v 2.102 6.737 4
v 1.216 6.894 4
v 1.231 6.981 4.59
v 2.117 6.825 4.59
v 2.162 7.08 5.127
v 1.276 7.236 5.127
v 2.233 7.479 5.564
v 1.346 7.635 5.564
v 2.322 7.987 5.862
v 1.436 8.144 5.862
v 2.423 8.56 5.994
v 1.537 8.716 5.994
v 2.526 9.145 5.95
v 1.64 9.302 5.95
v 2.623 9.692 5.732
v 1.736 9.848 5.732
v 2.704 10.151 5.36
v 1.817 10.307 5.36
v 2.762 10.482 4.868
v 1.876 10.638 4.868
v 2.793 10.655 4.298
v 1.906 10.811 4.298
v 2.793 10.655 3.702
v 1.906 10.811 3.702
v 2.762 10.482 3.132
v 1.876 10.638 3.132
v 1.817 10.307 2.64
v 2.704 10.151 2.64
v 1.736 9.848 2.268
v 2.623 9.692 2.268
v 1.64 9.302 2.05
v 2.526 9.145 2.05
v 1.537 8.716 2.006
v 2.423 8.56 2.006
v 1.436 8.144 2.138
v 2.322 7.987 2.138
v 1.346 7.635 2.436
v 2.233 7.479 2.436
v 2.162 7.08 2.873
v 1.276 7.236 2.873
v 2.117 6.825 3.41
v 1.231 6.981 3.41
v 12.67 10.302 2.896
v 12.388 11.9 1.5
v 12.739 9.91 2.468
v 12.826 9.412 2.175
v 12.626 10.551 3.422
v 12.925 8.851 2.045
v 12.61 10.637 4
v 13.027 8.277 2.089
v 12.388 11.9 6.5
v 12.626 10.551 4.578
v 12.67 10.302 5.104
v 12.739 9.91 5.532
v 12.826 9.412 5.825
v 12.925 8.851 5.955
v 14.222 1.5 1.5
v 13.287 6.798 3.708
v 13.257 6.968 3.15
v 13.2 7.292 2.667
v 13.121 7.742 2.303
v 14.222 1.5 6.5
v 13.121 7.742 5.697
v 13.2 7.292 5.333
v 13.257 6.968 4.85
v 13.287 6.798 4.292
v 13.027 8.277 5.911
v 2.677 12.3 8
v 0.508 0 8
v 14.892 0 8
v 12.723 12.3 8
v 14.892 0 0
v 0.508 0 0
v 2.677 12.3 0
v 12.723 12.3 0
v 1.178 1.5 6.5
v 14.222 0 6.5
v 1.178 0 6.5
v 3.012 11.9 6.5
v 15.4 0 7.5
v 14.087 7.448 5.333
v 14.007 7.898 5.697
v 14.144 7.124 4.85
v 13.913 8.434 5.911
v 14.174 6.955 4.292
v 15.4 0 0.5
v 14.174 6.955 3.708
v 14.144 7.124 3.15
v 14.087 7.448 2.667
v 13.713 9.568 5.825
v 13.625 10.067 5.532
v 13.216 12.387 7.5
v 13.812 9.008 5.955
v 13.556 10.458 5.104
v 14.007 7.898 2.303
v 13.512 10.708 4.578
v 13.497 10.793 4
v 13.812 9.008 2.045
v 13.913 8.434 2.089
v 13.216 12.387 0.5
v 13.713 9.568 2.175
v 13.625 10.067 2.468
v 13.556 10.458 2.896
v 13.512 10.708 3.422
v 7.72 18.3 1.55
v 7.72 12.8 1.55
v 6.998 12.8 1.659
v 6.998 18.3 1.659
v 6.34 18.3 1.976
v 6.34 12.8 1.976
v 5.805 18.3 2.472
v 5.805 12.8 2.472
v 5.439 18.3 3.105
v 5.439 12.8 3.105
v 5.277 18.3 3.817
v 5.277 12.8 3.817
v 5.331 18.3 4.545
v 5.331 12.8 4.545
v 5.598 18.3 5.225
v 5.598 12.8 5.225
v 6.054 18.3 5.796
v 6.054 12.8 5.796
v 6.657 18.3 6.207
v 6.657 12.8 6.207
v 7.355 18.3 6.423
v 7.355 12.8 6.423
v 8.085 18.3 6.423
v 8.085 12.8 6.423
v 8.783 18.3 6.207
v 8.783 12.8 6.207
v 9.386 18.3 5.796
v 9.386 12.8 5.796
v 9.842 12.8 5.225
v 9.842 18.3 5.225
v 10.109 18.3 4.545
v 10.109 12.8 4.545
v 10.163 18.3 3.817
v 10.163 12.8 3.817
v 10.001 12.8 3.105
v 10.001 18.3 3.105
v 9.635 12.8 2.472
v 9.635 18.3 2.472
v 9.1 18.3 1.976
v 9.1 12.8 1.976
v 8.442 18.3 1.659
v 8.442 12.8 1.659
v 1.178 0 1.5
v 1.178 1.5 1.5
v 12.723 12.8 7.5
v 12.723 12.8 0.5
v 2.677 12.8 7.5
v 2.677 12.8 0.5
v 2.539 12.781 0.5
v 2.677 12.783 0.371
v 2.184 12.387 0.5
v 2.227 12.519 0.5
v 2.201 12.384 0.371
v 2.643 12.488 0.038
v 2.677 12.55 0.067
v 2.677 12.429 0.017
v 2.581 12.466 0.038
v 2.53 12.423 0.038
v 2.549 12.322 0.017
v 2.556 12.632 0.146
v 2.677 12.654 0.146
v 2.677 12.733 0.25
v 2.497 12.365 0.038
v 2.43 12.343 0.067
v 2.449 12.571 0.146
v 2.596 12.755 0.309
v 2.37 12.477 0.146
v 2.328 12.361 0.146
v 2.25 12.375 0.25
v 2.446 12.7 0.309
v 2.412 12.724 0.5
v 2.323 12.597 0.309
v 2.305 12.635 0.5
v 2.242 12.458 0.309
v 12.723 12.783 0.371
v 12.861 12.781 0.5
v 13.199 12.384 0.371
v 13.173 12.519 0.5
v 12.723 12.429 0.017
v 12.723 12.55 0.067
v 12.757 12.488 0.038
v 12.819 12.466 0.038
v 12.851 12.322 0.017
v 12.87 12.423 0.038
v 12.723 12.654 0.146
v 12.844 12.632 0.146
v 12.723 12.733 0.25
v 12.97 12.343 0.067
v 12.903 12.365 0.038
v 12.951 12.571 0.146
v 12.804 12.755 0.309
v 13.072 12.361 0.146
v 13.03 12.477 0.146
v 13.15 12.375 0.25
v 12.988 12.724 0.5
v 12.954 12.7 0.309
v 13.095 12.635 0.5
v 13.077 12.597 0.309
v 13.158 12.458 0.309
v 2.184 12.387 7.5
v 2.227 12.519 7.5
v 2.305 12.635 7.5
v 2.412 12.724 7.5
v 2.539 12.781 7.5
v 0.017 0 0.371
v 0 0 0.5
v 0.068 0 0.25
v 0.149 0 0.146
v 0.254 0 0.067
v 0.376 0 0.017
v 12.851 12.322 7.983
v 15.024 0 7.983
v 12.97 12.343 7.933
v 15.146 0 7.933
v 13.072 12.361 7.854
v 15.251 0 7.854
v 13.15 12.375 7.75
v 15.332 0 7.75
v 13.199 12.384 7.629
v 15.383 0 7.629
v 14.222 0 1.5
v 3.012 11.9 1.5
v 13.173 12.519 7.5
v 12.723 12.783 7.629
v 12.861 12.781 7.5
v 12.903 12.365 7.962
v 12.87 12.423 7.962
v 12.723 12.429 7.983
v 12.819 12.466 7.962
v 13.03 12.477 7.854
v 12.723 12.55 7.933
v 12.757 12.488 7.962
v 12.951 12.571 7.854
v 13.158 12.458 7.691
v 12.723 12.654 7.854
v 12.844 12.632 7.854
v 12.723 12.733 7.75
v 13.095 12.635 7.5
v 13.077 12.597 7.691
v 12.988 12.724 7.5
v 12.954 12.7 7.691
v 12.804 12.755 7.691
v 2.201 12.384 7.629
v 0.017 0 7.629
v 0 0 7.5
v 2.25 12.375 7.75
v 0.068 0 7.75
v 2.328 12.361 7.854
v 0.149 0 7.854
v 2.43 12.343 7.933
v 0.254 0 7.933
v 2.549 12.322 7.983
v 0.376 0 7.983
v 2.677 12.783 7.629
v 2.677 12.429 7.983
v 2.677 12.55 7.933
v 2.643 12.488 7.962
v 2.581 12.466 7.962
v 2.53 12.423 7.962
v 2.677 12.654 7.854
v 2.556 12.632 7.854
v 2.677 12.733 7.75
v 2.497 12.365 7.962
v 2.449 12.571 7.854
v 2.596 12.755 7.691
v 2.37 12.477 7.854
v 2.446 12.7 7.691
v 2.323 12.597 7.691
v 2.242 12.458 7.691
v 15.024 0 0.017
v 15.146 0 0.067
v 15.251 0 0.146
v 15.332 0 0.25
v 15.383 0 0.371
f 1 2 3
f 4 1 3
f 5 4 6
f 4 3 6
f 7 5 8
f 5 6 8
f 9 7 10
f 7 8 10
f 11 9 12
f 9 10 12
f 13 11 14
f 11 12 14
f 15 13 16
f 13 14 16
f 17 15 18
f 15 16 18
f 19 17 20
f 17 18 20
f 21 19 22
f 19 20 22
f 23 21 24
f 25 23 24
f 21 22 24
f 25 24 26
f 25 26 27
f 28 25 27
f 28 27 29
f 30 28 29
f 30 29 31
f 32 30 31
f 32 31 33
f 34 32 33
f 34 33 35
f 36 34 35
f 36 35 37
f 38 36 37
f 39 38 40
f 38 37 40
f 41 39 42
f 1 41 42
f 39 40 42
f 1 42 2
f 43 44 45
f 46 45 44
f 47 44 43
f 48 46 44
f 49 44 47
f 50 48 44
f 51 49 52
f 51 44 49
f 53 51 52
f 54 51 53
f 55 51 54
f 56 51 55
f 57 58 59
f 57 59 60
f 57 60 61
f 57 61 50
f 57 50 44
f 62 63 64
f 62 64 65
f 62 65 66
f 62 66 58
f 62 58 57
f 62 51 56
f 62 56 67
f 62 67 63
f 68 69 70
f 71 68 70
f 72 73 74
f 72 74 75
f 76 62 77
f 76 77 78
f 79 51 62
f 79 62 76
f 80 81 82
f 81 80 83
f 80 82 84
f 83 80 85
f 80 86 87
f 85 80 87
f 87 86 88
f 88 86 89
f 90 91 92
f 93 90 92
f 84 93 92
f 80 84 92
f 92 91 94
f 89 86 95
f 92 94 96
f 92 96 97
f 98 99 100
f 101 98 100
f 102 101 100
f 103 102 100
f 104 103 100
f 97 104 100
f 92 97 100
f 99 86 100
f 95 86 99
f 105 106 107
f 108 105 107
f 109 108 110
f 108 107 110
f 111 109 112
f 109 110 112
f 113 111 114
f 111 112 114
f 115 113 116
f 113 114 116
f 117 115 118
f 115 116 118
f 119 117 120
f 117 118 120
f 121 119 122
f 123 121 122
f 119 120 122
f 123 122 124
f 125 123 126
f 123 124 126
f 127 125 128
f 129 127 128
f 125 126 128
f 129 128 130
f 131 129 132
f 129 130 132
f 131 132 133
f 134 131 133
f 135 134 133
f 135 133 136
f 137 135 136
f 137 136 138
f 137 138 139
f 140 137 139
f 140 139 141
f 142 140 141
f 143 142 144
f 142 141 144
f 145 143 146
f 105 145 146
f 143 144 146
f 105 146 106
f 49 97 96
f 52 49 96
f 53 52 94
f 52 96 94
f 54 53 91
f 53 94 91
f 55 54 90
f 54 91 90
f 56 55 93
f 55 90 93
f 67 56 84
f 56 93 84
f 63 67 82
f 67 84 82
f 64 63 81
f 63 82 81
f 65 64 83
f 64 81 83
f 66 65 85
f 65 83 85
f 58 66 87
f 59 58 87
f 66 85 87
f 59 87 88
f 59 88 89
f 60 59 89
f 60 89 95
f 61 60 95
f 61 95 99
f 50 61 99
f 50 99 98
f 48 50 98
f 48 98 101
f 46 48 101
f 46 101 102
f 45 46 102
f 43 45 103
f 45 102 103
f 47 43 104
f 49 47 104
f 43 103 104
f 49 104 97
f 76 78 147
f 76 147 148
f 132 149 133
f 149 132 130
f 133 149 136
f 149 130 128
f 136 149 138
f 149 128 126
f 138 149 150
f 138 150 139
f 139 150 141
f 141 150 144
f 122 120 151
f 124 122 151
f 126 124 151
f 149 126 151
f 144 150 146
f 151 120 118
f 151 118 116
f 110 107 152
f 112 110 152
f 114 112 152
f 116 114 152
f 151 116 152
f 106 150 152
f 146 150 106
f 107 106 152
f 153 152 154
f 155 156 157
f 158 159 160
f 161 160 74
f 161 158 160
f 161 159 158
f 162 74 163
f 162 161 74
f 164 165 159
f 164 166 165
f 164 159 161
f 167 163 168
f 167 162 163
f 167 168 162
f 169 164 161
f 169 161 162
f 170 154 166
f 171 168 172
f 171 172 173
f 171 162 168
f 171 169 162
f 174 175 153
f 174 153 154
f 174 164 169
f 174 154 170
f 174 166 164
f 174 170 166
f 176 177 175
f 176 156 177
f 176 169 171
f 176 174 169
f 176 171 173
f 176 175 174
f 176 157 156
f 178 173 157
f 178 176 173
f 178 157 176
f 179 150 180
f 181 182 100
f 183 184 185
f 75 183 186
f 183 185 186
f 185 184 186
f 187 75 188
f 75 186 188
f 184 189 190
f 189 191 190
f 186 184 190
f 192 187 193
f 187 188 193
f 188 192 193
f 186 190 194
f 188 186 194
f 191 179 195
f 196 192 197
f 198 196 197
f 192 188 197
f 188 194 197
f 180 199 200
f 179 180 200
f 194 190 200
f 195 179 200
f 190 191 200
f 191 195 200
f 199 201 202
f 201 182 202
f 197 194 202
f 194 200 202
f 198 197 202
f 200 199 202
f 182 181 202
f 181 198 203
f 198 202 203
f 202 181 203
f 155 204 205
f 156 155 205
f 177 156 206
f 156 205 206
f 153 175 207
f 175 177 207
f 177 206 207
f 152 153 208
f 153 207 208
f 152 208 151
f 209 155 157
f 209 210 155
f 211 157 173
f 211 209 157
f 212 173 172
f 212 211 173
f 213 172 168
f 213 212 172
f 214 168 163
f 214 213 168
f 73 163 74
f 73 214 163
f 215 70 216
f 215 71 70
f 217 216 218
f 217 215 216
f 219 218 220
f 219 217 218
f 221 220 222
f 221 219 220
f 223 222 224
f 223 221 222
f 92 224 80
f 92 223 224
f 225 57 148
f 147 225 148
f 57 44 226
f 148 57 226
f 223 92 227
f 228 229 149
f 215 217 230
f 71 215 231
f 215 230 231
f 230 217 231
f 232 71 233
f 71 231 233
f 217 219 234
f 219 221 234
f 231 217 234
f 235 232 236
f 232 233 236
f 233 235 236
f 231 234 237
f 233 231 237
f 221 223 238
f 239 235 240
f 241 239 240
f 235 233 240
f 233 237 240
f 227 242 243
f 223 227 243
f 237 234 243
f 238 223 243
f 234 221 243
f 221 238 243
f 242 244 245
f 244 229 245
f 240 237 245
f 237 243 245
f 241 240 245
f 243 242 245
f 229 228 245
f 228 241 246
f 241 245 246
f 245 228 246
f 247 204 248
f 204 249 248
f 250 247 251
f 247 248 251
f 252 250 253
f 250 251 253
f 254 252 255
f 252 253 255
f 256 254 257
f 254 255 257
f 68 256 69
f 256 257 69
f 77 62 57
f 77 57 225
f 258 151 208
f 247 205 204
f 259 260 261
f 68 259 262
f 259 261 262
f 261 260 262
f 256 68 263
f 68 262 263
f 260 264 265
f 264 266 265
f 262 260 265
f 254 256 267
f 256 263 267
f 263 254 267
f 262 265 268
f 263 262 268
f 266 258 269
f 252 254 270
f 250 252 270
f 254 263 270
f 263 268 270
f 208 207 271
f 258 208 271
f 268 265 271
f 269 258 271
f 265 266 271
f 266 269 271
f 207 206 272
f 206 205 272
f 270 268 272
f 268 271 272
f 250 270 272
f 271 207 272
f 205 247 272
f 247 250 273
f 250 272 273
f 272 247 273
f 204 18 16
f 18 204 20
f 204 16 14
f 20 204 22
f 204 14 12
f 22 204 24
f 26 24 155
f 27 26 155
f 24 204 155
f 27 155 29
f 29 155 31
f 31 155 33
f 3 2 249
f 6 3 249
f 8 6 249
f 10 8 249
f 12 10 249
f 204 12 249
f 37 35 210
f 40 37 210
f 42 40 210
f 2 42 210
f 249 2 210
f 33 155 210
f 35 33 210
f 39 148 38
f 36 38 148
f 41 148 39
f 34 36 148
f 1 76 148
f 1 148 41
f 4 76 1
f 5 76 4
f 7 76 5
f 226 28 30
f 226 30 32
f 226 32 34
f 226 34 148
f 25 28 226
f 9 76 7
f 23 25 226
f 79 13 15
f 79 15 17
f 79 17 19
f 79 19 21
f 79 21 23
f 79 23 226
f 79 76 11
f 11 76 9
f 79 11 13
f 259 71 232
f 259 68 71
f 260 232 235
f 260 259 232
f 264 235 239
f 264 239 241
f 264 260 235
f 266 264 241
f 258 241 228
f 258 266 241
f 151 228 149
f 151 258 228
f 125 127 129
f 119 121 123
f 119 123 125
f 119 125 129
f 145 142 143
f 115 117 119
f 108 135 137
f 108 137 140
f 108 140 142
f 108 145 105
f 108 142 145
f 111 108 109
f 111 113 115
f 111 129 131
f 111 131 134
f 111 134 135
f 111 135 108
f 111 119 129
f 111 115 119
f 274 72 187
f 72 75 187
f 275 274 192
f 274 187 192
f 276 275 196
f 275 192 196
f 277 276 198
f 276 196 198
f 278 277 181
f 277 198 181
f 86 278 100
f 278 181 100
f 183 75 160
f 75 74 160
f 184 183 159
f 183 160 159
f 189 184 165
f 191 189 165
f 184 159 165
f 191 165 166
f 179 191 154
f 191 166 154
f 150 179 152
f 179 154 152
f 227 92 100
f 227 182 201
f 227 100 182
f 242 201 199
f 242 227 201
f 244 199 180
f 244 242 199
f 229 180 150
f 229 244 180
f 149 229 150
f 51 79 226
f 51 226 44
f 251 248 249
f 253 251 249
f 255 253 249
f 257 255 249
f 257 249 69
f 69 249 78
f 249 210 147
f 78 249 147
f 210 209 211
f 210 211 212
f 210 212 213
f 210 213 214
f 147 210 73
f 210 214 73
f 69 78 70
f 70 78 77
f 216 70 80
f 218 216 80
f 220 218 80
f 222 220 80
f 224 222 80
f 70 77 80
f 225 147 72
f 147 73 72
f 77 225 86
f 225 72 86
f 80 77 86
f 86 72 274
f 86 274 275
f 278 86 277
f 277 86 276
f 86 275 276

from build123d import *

# Parameters (mm, degrees)
BOSS_EXTRUDE1_DEPTH = 8
CUT_EXTRUDE3_START  = -1.5
CUT_EXTRUDE3_DEPTH  = 5
SKETCH2_R           = 1.96
CUT_EXTRUDE1_DEPTH  = 0.9
SKETCH3_R           = 2
CUT_EXTRUDE2_DEPTH  = 0.9
FILLET1_R           = 0.5
SKETCH4_R           = 2.45
BOSS_EXTRUDE2_DEPTH = 5.5


with BuildPart() as part:
    # Sketch1 → Boss-Extrude1 (new body)
    with BuildSketch(Plane.XY):
        Polygon((0, 0), (15.4, 0), (13.143014647, 12.8), (2.256985353, 12.8), align=None)
    extrude(amount=BOSS_EXTRUDE1_DEPTH)

    # Sketch5 → Cut-Extrude3 (cut)
    with BuildSketch(Plane.XY.offset(8).offset(CUT_EXTRUDE3_START)):
        Polygon((1.178374422, 0), (1.178374422, 1.5), (3.012175021, 11.9), (12.387824979, 11.9), (14.221625578, 1.5), (14.221625578, 0), align=None)
    extrude(amount=-CUT_EXTRUDE3_DEPTH, mode=Mode.SUBTRACT)

    # Sketch2 → Cut-Extrude1 (cut)
    with BuildSketch(Plane(origin=(14.93563318, 2.633555104, 0), x_dir=(0, 0, -1), z_dir=(0.9848077530122086, 0.17364817766692736, 0))):
        with Locations(Location((-4, 6.325818064, 0), (0, 0, 90))):
            Circle(SKETCH2_R)
    extrude(amount=-CUT_EXTRUDE1_DEPTH, mode=Mode.SUBTRACT)

    # Sketch3 → Cut-Extrude2 (cut)
    with BuildSketch(Plane(origin=(0, 0, 0), x_dir=(0, 0, 1), z_dir=(-0.9848077530122087, 0.17364817766692736, 0))):
        with Locations(Location((4, 9, 0), (0, 0, 270))):
            Circle(SKETCH3_R)
    extrude(amount=-CUT_EXTRUDE2_DEPTH, mode=Mode.SUBTRACT)

    # Fillet1
    fillet1_edges = [part.edges().sort_by_distance(p)[0] for p in [
        (14.271507323, 6.4, 8),
        (7.7, 12.8, 8),
        (1.128492677, 6.4, 8),
        (7.7, 12.8, 0),
        (14.271507323, 6.4, 0),
        (1.128492677, 6.4, 0),
        (2.256985353, 12.8, 4),
        (13.143014647, 12.8, 4),
    ]]
    fillet(fillet1_edges, radius=FILLET1_R)

    # Sketch4 → Boss-Extrude2 (add)
    with BuildSketch(Plane(origin=(0, 12.8, 0), x_dir=(1, 0, 0), z_dir=(0, 1, 0))):
        with Locations(Location((7.72, -4, 0), (0, 0, 90))):
            Circle(SKETCH4_R)
    extrude(amount=BOSS_EXTRUDE2_DEPTH)


solid = part.part
